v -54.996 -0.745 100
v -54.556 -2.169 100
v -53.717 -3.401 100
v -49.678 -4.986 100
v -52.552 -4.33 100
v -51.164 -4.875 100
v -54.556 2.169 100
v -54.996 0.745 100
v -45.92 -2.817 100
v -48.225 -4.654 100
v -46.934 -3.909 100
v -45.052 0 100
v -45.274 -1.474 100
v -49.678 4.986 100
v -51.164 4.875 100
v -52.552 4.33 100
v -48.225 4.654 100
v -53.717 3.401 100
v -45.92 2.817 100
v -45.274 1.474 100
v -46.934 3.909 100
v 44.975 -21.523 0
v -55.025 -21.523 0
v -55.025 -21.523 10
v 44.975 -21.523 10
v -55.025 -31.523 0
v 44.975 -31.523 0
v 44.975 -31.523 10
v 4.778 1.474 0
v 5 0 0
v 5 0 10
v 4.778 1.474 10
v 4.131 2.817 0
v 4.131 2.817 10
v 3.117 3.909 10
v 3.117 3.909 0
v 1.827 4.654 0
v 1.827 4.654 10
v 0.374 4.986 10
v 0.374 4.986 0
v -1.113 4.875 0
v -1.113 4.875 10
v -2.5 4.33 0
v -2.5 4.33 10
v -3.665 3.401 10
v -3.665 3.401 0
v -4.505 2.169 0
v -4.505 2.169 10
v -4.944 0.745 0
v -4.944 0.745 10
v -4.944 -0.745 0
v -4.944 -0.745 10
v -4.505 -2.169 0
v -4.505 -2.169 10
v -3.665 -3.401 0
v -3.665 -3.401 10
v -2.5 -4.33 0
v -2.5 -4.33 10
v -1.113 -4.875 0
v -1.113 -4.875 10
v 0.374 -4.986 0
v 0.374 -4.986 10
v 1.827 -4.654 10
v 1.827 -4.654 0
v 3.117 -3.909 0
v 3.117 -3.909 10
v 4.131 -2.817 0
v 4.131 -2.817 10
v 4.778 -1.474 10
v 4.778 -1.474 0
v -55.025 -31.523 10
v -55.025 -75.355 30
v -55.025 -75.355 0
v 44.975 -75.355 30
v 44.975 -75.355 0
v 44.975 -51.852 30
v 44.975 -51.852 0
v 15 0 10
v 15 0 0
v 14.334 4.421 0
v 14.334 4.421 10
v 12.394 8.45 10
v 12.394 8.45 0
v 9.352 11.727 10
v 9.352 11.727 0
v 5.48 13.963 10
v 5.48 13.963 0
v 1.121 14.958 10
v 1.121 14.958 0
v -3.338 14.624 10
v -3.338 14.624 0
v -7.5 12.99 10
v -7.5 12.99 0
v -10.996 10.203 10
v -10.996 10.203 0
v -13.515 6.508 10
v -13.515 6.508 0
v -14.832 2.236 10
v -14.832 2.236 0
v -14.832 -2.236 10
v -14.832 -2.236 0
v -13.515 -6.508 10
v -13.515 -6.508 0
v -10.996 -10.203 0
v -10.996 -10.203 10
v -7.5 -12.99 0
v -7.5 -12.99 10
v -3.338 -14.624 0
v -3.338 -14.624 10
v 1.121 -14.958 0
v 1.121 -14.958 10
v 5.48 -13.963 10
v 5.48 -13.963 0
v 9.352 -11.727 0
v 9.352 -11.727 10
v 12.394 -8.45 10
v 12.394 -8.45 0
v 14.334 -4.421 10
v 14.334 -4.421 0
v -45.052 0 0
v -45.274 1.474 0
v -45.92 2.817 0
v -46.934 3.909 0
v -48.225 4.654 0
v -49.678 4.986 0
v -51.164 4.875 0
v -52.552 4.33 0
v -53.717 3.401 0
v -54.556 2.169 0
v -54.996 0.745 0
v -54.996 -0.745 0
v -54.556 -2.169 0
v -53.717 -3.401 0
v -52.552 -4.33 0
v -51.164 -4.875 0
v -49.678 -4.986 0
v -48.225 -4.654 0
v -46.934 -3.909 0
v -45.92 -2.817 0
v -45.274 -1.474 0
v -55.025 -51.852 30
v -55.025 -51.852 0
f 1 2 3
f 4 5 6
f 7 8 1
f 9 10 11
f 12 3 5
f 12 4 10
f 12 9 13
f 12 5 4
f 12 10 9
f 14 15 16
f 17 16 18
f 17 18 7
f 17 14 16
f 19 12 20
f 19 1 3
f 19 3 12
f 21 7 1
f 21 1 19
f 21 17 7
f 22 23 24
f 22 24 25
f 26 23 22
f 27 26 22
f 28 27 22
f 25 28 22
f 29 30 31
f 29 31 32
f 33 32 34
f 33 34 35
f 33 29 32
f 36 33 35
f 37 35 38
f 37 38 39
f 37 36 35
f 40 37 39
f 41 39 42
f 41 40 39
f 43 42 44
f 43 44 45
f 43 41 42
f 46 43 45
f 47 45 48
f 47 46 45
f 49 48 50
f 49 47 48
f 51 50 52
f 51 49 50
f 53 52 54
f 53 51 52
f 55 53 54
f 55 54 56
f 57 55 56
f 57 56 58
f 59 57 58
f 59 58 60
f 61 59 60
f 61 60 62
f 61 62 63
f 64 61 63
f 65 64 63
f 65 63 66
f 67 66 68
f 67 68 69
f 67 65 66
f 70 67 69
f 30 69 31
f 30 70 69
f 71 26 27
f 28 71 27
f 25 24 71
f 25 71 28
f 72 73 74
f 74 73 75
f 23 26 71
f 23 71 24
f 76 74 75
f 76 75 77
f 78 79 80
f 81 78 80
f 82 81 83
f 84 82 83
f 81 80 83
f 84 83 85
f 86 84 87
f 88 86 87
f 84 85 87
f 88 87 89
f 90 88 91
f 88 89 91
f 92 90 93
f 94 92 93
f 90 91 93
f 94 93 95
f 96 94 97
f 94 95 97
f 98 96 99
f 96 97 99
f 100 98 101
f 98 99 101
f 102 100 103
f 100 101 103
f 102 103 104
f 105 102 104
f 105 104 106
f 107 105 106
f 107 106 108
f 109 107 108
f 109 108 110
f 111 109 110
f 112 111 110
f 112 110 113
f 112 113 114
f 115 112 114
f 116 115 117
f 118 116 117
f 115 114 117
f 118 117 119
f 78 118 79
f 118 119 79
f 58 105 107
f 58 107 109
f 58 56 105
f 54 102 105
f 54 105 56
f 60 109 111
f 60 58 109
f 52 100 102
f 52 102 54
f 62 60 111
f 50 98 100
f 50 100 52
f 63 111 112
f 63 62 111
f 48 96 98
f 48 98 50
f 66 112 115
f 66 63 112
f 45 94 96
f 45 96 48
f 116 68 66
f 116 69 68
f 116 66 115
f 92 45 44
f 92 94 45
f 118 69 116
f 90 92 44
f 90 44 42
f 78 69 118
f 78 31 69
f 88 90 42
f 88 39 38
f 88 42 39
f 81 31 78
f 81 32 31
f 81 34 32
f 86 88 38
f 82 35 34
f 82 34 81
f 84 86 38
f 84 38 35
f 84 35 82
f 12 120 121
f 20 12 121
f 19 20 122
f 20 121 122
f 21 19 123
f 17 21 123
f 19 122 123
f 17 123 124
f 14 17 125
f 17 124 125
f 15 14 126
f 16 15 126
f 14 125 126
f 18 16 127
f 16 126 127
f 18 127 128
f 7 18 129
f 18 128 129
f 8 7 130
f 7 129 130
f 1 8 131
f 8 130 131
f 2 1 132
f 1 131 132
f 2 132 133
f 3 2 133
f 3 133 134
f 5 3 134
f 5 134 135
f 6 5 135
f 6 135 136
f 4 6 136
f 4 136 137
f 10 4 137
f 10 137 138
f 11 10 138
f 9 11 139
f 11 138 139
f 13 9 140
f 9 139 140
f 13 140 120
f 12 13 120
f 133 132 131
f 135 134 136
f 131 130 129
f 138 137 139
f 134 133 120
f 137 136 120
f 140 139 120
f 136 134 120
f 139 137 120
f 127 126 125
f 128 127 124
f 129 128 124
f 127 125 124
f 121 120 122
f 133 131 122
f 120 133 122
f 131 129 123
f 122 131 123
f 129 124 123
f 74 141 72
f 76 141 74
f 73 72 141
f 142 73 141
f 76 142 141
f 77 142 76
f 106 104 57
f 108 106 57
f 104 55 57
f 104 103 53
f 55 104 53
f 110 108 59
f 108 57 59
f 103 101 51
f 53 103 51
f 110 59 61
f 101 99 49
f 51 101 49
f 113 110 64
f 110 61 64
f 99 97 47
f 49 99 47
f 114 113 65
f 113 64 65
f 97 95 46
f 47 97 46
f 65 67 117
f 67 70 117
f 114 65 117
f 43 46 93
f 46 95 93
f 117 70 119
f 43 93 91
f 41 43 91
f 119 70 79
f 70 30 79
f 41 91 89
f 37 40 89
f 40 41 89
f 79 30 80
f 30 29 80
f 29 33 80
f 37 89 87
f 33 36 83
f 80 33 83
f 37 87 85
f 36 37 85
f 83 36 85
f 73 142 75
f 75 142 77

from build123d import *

# Parameters (mm, degrees)
F0_R     = 15
F0_R_2   = 5
F0_W     = 100
F0_H     = 10
F1_DEPTH = 10
F2_DEPTH = 100
F0_H_2   = 23.502034
F3_DEPTH = 30


with BuildPart() as f1:
    # F0 (on Top) → F1 (new body)
    with BuildSketch(Plane.XY):
        Circle(F0_R)
        Circle(F0_R_2, mode=Mode.SUBTRACT)
        with Locations((-5.024605, -26.522572)):
            Rectangle(F0_W, F0_H)
    extrude(amount=F1_DEPTH)


with BuildPart() as f2:
    # F0 (on Top) → F2 (new body)
    with BuildSketch(Plane.XY):
        with Locations((-50.051518, 0)):
            Circle(F0_R_2)
    extrude(amount=F2_DEPTH)


with BuildPart() as f3:
    # F0 (on Top) → F3 (new body)
    with BuildSketch(Plane.XY):
        with Locations((-5.024605, -63.6035)):
            Rectangle(F0_W, F0_H_2)
    extrude(amount=F3_DEPTH)


solid = Compound([f1.part, f2.part, f3.part])
